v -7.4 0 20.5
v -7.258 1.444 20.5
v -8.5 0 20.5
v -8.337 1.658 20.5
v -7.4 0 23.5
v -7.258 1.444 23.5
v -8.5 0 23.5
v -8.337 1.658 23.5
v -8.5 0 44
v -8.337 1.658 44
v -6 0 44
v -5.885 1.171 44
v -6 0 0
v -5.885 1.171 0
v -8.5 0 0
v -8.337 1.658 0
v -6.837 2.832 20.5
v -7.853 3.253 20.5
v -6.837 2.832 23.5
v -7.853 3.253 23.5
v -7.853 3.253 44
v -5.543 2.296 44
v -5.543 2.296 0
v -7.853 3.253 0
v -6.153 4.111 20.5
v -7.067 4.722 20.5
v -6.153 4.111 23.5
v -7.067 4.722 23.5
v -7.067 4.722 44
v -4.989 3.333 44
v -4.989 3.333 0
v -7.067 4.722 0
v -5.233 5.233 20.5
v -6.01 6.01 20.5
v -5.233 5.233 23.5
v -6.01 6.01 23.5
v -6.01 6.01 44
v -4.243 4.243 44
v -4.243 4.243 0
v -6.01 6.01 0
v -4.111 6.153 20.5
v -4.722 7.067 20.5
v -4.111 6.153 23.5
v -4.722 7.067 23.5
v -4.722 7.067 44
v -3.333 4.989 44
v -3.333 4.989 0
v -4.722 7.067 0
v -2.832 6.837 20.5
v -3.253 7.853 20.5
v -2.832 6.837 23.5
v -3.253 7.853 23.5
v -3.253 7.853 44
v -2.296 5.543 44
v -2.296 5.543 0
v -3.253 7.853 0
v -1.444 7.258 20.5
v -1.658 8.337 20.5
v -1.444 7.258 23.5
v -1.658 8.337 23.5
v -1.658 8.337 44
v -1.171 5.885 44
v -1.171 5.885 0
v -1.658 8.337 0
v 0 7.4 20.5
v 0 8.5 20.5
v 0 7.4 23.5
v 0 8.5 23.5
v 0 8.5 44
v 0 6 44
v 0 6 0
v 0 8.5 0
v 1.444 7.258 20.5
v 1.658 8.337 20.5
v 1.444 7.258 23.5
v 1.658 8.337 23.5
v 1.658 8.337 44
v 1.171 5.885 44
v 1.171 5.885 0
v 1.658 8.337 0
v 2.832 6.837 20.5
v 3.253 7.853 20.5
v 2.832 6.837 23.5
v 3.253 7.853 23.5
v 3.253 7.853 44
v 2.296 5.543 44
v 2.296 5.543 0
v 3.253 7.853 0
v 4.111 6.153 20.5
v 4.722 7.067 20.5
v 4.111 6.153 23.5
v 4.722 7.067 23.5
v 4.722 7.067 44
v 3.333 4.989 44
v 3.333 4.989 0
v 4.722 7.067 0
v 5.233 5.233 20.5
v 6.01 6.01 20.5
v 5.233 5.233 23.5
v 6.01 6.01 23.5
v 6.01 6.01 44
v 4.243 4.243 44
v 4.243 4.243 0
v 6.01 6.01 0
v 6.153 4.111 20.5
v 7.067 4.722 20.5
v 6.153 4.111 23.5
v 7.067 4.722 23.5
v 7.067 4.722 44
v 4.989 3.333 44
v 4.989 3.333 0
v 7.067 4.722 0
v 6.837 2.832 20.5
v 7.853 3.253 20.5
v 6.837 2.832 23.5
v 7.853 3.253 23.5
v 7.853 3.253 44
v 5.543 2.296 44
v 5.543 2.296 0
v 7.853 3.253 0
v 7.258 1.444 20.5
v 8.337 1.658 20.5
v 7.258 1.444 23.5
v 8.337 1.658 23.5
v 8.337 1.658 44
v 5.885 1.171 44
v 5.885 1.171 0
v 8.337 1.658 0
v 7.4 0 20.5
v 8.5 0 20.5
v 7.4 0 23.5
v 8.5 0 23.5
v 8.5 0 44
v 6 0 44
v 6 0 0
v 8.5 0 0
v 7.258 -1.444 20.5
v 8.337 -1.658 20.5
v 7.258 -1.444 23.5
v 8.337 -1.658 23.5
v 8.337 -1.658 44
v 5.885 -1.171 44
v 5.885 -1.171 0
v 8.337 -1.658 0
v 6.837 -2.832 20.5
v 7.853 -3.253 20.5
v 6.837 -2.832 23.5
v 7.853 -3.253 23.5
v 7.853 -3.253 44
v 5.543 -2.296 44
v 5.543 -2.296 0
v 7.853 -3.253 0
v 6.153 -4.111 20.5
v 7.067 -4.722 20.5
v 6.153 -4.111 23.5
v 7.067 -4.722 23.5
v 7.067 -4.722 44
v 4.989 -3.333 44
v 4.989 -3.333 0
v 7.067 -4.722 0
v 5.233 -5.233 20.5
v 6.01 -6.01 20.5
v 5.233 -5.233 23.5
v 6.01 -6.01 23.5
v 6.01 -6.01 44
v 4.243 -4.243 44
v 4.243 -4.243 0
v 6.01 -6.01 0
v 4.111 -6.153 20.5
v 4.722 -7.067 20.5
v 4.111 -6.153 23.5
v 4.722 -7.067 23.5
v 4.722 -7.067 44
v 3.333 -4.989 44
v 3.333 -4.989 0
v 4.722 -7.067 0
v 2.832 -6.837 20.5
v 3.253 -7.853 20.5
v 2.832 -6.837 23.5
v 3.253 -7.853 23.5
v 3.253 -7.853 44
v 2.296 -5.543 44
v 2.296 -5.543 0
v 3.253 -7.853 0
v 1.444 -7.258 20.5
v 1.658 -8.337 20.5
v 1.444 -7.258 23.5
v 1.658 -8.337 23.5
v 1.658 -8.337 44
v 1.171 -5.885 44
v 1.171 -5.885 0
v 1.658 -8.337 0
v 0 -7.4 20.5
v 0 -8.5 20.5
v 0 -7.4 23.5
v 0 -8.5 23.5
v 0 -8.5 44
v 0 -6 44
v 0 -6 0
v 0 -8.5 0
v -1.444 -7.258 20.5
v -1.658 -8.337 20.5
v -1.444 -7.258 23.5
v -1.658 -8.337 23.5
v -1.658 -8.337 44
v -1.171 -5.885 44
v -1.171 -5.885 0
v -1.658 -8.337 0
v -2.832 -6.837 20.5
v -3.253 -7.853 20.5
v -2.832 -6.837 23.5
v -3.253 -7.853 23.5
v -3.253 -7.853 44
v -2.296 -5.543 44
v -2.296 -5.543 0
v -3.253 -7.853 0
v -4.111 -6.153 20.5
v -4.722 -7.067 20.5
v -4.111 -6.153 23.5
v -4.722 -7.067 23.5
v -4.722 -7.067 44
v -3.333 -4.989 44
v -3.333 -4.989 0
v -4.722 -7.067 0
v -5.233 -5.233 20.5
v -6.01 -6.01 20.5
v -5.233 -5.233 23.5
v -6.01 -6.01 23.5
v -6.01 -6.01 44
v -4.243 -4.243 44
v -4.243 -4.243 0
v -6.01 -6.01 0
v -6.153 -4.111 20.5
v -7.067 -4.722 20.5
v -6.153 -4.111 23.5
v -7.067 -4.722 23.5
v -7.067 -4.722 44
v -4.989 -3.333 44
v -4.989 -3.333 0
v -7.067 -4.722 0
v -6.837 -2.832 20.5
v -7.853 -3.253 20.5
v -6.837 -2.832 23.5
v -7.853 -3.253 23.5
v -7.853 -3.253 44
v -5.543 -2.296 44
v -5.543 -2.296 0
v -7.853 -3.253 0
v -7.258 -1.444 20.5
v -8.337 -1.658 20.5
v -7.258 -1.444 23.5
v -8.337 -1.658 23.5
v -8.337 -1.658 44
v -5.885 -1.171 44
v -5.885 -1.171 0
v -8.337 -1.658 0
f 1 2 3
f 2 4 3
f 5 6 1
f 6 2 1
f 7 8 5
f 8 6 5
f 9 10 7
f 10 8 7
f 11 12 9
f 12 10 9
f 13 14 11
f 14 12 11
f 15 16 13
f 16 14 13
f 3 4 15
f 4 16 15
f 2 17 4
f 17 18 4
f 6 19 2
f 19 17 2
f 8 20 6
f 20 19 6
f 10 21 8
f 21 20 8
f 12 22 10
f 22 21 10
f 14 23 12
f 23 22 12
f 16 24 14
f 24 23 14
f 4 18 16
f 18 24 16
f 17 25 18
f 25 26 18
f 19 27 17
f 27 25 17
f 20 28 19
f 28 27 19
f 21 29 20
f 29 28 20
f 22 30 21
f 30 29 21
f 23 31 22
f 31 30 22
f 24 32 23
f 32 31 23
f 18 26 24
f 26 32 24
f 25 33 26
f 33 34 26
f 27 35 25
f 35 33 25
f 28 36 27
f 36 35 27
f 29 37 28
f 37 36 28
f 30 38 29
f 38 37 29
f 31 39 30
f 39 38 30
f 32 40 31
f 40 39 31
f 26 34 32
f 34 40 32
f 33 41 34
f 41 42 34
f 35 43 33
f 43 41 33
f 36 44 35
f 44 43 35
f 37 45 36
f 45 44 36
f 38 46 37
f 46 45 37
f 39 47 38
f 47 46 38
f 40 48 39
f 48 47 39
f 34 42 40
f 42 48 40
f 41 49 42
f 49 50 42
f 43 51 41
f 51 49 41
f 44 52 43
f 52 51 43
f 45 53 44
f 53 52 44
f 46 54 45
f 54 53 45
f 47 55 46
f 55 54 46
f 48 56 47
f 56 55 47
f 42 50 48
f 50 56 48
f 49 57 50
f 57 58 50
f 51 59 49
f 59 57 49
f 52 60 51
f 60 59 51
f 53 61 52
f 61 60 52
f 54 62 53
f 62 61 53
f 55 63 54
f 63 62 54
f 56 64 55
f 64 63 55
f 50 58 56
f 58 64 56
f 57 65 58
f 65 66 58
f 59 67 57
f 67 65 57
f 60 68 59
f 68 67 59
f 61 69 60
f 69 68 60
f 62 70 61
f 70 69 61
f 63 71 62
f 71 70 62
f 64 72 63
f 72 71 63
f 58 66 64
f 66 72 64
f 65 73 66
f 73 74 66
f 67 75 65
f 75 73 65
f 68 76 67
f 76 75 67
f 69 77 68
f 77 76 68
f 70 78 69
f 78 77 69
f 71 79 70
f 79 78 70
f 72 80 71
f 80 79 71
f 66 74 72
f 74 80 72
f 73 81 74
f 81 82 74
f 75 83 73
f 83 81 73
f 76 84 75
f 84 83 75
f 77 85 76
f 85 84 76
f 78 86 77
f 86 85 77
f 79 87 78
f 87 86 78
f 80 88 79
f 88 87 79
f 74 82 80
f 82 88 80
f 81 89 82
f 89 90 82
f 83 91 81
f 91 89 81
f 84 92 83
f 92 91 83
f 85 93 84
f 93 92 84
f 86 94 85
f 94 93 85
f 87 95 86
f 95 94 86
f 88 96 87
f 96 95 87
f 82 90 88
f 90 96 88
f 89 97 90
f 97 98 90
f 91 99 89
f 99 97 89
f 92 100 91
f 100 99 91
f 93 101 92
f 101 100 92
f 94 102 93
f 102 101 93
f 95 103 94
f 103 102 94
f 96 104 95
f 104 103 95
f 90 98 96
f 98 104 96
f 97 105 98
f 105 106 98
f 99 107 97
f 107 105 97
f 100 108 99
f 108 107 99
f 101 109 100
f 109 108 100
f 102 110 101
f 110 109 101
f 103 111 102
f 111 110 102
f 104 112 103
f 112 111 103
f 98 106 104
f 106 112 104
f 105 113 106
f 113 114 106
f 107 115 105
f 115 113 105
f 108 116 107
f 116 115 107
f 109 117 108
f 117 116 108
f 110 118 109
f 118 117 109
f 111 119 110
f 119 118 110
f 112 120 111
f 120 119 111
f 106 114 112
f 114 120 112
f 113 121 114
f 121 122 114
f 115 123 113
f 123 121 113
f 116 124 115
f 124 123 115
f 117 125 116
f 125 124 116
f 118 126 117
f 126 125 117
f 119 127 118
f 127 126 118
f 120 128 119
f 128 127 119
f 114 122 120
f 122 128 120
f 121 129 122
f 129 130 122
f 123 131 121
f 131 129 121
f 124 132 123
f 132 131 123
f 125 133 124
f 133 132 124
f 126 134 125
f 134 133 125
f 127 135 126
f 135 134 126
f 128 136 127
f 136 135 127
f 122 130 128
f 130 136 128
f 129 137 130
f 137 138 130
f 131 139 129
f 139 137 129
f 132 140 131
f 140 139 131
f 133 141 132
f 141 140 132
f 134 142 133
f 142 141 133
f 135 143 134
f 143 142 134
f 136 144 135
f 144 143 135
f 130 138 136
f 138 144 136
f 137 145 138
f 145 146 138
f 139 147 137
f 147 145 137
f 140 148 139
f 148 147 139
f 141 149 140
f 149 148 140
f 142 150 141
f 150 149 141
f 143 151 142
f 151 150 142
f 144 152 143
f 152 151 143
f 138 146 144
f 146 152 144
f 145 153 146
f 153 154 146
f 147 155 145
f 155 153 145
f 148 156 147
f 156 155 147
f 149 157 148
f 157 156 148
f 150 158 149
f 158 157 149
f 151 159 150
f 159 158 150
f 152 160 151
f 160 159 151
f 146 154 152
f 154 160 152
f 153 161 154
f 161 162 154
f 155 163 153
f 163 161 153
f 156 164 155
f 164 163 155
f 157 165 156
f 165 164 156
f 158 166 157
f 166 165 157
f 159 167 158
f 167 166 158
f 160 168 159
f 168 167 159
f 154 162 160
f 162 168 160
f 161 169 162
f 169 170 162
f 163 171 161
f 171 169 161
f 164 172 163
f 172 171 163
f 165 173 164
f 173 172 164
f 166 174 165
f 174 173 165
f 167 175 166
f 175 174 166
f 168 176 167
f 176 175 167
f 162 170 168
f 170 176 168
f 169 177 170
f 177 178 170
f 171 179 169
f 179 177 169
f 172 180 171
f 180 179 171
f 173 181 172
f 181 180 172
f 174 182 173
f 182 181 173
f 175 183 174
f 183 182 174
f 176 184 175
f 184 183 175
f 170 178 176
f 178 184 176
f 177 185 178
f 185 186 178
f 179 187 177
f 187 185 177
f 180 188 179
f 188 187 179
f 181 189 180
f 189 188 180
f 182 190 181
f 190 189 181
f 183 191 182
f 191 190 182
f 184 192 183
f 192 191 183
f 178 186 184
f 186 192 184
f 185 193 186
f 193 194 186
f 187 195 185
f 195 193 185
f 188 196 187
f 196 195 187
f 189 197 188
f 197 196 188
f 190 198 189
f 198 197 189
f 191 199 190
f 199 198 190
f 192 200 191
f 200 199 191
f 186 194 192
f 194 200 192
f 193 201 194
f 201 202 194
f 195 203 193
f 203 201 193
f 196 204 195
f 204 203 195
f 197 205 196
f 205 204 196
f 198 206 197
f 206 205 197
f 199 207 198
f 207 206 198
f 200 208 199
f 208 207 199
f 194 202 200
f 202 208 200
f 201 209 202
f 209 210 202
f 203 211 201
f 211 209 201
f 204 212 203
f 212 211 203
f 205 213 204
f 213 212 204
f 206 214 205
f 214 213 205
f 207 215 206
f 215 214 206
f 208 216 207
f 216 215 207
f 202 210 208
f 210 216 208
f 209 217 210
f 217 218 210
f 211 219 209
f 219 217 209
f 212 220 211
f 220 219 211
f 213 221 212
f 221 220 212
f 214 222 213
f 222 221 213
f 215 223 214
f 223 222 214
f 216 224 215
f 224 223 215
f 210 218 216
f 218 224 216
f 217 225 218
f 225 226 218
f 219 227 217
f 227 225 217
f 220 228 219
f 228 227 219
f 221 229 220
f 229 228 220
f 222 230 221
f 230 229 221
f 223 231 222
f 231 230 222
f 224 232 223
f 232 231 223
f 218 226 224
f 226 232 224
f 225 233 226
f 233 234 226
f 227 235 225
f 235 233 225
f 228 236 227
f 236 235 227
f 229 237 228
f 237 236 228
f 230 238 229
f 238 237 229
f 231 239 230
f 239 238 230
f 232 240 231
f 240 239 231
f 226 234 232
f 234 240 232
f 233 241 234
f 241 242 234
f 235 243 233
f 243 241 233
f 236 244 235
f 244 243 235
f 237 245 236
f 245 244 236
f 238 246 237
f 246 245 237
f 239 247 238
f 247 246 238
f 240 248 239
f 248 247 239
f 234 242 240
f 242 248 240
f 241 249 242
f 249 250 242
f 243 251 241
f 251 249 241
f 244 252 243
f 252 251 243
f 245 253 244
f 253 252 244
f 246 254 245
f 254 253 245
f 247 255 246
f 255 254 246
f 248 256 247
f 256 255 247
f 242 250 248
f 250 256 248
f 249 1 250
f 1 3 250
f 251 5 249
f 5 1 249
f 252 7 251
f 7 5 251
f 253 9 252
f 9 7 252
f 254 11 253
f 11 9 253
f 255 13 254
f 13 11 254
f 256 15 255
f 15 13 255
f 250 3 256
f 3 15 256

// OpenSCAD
$fn = 32;

// ----------------------------------------------------------------------
// Grooved revolve: plain_grooves, bore R6
// ----------------------------------------------------------------------

// --- parameters (mm) ---
bore_r = 6;               // bore radius
outer_r = 8.5;            // outer radius of the body
total_h = 44;             // overall height, Z
wall = 2.5;               // radial wall thickness
groove_w = 3;             // groove width
groove_d = 1.1;           // groove depth
grooves = 1;              // number of outer grooves

bbox_x = 2 * outer_r;  // full diameter
bore_d = 2 * bore_r;  // bore diameter
body_d = 2 * outer_r;  // body diameter
revolve_angle = 360;  // full turn around the Z axis

profile = [[6, 0], [8.5, 0], [8.5, 20.5], [7.4, 20.5], [7.4, 23.5], [8.5, 23.5], [8.5, 44], [6, 44]];  // primary outline, 8 points, counter clockwise

// --- the one profile operation ---
rotate_extrude(angle = revolve_angle) polygon(points = profile);
